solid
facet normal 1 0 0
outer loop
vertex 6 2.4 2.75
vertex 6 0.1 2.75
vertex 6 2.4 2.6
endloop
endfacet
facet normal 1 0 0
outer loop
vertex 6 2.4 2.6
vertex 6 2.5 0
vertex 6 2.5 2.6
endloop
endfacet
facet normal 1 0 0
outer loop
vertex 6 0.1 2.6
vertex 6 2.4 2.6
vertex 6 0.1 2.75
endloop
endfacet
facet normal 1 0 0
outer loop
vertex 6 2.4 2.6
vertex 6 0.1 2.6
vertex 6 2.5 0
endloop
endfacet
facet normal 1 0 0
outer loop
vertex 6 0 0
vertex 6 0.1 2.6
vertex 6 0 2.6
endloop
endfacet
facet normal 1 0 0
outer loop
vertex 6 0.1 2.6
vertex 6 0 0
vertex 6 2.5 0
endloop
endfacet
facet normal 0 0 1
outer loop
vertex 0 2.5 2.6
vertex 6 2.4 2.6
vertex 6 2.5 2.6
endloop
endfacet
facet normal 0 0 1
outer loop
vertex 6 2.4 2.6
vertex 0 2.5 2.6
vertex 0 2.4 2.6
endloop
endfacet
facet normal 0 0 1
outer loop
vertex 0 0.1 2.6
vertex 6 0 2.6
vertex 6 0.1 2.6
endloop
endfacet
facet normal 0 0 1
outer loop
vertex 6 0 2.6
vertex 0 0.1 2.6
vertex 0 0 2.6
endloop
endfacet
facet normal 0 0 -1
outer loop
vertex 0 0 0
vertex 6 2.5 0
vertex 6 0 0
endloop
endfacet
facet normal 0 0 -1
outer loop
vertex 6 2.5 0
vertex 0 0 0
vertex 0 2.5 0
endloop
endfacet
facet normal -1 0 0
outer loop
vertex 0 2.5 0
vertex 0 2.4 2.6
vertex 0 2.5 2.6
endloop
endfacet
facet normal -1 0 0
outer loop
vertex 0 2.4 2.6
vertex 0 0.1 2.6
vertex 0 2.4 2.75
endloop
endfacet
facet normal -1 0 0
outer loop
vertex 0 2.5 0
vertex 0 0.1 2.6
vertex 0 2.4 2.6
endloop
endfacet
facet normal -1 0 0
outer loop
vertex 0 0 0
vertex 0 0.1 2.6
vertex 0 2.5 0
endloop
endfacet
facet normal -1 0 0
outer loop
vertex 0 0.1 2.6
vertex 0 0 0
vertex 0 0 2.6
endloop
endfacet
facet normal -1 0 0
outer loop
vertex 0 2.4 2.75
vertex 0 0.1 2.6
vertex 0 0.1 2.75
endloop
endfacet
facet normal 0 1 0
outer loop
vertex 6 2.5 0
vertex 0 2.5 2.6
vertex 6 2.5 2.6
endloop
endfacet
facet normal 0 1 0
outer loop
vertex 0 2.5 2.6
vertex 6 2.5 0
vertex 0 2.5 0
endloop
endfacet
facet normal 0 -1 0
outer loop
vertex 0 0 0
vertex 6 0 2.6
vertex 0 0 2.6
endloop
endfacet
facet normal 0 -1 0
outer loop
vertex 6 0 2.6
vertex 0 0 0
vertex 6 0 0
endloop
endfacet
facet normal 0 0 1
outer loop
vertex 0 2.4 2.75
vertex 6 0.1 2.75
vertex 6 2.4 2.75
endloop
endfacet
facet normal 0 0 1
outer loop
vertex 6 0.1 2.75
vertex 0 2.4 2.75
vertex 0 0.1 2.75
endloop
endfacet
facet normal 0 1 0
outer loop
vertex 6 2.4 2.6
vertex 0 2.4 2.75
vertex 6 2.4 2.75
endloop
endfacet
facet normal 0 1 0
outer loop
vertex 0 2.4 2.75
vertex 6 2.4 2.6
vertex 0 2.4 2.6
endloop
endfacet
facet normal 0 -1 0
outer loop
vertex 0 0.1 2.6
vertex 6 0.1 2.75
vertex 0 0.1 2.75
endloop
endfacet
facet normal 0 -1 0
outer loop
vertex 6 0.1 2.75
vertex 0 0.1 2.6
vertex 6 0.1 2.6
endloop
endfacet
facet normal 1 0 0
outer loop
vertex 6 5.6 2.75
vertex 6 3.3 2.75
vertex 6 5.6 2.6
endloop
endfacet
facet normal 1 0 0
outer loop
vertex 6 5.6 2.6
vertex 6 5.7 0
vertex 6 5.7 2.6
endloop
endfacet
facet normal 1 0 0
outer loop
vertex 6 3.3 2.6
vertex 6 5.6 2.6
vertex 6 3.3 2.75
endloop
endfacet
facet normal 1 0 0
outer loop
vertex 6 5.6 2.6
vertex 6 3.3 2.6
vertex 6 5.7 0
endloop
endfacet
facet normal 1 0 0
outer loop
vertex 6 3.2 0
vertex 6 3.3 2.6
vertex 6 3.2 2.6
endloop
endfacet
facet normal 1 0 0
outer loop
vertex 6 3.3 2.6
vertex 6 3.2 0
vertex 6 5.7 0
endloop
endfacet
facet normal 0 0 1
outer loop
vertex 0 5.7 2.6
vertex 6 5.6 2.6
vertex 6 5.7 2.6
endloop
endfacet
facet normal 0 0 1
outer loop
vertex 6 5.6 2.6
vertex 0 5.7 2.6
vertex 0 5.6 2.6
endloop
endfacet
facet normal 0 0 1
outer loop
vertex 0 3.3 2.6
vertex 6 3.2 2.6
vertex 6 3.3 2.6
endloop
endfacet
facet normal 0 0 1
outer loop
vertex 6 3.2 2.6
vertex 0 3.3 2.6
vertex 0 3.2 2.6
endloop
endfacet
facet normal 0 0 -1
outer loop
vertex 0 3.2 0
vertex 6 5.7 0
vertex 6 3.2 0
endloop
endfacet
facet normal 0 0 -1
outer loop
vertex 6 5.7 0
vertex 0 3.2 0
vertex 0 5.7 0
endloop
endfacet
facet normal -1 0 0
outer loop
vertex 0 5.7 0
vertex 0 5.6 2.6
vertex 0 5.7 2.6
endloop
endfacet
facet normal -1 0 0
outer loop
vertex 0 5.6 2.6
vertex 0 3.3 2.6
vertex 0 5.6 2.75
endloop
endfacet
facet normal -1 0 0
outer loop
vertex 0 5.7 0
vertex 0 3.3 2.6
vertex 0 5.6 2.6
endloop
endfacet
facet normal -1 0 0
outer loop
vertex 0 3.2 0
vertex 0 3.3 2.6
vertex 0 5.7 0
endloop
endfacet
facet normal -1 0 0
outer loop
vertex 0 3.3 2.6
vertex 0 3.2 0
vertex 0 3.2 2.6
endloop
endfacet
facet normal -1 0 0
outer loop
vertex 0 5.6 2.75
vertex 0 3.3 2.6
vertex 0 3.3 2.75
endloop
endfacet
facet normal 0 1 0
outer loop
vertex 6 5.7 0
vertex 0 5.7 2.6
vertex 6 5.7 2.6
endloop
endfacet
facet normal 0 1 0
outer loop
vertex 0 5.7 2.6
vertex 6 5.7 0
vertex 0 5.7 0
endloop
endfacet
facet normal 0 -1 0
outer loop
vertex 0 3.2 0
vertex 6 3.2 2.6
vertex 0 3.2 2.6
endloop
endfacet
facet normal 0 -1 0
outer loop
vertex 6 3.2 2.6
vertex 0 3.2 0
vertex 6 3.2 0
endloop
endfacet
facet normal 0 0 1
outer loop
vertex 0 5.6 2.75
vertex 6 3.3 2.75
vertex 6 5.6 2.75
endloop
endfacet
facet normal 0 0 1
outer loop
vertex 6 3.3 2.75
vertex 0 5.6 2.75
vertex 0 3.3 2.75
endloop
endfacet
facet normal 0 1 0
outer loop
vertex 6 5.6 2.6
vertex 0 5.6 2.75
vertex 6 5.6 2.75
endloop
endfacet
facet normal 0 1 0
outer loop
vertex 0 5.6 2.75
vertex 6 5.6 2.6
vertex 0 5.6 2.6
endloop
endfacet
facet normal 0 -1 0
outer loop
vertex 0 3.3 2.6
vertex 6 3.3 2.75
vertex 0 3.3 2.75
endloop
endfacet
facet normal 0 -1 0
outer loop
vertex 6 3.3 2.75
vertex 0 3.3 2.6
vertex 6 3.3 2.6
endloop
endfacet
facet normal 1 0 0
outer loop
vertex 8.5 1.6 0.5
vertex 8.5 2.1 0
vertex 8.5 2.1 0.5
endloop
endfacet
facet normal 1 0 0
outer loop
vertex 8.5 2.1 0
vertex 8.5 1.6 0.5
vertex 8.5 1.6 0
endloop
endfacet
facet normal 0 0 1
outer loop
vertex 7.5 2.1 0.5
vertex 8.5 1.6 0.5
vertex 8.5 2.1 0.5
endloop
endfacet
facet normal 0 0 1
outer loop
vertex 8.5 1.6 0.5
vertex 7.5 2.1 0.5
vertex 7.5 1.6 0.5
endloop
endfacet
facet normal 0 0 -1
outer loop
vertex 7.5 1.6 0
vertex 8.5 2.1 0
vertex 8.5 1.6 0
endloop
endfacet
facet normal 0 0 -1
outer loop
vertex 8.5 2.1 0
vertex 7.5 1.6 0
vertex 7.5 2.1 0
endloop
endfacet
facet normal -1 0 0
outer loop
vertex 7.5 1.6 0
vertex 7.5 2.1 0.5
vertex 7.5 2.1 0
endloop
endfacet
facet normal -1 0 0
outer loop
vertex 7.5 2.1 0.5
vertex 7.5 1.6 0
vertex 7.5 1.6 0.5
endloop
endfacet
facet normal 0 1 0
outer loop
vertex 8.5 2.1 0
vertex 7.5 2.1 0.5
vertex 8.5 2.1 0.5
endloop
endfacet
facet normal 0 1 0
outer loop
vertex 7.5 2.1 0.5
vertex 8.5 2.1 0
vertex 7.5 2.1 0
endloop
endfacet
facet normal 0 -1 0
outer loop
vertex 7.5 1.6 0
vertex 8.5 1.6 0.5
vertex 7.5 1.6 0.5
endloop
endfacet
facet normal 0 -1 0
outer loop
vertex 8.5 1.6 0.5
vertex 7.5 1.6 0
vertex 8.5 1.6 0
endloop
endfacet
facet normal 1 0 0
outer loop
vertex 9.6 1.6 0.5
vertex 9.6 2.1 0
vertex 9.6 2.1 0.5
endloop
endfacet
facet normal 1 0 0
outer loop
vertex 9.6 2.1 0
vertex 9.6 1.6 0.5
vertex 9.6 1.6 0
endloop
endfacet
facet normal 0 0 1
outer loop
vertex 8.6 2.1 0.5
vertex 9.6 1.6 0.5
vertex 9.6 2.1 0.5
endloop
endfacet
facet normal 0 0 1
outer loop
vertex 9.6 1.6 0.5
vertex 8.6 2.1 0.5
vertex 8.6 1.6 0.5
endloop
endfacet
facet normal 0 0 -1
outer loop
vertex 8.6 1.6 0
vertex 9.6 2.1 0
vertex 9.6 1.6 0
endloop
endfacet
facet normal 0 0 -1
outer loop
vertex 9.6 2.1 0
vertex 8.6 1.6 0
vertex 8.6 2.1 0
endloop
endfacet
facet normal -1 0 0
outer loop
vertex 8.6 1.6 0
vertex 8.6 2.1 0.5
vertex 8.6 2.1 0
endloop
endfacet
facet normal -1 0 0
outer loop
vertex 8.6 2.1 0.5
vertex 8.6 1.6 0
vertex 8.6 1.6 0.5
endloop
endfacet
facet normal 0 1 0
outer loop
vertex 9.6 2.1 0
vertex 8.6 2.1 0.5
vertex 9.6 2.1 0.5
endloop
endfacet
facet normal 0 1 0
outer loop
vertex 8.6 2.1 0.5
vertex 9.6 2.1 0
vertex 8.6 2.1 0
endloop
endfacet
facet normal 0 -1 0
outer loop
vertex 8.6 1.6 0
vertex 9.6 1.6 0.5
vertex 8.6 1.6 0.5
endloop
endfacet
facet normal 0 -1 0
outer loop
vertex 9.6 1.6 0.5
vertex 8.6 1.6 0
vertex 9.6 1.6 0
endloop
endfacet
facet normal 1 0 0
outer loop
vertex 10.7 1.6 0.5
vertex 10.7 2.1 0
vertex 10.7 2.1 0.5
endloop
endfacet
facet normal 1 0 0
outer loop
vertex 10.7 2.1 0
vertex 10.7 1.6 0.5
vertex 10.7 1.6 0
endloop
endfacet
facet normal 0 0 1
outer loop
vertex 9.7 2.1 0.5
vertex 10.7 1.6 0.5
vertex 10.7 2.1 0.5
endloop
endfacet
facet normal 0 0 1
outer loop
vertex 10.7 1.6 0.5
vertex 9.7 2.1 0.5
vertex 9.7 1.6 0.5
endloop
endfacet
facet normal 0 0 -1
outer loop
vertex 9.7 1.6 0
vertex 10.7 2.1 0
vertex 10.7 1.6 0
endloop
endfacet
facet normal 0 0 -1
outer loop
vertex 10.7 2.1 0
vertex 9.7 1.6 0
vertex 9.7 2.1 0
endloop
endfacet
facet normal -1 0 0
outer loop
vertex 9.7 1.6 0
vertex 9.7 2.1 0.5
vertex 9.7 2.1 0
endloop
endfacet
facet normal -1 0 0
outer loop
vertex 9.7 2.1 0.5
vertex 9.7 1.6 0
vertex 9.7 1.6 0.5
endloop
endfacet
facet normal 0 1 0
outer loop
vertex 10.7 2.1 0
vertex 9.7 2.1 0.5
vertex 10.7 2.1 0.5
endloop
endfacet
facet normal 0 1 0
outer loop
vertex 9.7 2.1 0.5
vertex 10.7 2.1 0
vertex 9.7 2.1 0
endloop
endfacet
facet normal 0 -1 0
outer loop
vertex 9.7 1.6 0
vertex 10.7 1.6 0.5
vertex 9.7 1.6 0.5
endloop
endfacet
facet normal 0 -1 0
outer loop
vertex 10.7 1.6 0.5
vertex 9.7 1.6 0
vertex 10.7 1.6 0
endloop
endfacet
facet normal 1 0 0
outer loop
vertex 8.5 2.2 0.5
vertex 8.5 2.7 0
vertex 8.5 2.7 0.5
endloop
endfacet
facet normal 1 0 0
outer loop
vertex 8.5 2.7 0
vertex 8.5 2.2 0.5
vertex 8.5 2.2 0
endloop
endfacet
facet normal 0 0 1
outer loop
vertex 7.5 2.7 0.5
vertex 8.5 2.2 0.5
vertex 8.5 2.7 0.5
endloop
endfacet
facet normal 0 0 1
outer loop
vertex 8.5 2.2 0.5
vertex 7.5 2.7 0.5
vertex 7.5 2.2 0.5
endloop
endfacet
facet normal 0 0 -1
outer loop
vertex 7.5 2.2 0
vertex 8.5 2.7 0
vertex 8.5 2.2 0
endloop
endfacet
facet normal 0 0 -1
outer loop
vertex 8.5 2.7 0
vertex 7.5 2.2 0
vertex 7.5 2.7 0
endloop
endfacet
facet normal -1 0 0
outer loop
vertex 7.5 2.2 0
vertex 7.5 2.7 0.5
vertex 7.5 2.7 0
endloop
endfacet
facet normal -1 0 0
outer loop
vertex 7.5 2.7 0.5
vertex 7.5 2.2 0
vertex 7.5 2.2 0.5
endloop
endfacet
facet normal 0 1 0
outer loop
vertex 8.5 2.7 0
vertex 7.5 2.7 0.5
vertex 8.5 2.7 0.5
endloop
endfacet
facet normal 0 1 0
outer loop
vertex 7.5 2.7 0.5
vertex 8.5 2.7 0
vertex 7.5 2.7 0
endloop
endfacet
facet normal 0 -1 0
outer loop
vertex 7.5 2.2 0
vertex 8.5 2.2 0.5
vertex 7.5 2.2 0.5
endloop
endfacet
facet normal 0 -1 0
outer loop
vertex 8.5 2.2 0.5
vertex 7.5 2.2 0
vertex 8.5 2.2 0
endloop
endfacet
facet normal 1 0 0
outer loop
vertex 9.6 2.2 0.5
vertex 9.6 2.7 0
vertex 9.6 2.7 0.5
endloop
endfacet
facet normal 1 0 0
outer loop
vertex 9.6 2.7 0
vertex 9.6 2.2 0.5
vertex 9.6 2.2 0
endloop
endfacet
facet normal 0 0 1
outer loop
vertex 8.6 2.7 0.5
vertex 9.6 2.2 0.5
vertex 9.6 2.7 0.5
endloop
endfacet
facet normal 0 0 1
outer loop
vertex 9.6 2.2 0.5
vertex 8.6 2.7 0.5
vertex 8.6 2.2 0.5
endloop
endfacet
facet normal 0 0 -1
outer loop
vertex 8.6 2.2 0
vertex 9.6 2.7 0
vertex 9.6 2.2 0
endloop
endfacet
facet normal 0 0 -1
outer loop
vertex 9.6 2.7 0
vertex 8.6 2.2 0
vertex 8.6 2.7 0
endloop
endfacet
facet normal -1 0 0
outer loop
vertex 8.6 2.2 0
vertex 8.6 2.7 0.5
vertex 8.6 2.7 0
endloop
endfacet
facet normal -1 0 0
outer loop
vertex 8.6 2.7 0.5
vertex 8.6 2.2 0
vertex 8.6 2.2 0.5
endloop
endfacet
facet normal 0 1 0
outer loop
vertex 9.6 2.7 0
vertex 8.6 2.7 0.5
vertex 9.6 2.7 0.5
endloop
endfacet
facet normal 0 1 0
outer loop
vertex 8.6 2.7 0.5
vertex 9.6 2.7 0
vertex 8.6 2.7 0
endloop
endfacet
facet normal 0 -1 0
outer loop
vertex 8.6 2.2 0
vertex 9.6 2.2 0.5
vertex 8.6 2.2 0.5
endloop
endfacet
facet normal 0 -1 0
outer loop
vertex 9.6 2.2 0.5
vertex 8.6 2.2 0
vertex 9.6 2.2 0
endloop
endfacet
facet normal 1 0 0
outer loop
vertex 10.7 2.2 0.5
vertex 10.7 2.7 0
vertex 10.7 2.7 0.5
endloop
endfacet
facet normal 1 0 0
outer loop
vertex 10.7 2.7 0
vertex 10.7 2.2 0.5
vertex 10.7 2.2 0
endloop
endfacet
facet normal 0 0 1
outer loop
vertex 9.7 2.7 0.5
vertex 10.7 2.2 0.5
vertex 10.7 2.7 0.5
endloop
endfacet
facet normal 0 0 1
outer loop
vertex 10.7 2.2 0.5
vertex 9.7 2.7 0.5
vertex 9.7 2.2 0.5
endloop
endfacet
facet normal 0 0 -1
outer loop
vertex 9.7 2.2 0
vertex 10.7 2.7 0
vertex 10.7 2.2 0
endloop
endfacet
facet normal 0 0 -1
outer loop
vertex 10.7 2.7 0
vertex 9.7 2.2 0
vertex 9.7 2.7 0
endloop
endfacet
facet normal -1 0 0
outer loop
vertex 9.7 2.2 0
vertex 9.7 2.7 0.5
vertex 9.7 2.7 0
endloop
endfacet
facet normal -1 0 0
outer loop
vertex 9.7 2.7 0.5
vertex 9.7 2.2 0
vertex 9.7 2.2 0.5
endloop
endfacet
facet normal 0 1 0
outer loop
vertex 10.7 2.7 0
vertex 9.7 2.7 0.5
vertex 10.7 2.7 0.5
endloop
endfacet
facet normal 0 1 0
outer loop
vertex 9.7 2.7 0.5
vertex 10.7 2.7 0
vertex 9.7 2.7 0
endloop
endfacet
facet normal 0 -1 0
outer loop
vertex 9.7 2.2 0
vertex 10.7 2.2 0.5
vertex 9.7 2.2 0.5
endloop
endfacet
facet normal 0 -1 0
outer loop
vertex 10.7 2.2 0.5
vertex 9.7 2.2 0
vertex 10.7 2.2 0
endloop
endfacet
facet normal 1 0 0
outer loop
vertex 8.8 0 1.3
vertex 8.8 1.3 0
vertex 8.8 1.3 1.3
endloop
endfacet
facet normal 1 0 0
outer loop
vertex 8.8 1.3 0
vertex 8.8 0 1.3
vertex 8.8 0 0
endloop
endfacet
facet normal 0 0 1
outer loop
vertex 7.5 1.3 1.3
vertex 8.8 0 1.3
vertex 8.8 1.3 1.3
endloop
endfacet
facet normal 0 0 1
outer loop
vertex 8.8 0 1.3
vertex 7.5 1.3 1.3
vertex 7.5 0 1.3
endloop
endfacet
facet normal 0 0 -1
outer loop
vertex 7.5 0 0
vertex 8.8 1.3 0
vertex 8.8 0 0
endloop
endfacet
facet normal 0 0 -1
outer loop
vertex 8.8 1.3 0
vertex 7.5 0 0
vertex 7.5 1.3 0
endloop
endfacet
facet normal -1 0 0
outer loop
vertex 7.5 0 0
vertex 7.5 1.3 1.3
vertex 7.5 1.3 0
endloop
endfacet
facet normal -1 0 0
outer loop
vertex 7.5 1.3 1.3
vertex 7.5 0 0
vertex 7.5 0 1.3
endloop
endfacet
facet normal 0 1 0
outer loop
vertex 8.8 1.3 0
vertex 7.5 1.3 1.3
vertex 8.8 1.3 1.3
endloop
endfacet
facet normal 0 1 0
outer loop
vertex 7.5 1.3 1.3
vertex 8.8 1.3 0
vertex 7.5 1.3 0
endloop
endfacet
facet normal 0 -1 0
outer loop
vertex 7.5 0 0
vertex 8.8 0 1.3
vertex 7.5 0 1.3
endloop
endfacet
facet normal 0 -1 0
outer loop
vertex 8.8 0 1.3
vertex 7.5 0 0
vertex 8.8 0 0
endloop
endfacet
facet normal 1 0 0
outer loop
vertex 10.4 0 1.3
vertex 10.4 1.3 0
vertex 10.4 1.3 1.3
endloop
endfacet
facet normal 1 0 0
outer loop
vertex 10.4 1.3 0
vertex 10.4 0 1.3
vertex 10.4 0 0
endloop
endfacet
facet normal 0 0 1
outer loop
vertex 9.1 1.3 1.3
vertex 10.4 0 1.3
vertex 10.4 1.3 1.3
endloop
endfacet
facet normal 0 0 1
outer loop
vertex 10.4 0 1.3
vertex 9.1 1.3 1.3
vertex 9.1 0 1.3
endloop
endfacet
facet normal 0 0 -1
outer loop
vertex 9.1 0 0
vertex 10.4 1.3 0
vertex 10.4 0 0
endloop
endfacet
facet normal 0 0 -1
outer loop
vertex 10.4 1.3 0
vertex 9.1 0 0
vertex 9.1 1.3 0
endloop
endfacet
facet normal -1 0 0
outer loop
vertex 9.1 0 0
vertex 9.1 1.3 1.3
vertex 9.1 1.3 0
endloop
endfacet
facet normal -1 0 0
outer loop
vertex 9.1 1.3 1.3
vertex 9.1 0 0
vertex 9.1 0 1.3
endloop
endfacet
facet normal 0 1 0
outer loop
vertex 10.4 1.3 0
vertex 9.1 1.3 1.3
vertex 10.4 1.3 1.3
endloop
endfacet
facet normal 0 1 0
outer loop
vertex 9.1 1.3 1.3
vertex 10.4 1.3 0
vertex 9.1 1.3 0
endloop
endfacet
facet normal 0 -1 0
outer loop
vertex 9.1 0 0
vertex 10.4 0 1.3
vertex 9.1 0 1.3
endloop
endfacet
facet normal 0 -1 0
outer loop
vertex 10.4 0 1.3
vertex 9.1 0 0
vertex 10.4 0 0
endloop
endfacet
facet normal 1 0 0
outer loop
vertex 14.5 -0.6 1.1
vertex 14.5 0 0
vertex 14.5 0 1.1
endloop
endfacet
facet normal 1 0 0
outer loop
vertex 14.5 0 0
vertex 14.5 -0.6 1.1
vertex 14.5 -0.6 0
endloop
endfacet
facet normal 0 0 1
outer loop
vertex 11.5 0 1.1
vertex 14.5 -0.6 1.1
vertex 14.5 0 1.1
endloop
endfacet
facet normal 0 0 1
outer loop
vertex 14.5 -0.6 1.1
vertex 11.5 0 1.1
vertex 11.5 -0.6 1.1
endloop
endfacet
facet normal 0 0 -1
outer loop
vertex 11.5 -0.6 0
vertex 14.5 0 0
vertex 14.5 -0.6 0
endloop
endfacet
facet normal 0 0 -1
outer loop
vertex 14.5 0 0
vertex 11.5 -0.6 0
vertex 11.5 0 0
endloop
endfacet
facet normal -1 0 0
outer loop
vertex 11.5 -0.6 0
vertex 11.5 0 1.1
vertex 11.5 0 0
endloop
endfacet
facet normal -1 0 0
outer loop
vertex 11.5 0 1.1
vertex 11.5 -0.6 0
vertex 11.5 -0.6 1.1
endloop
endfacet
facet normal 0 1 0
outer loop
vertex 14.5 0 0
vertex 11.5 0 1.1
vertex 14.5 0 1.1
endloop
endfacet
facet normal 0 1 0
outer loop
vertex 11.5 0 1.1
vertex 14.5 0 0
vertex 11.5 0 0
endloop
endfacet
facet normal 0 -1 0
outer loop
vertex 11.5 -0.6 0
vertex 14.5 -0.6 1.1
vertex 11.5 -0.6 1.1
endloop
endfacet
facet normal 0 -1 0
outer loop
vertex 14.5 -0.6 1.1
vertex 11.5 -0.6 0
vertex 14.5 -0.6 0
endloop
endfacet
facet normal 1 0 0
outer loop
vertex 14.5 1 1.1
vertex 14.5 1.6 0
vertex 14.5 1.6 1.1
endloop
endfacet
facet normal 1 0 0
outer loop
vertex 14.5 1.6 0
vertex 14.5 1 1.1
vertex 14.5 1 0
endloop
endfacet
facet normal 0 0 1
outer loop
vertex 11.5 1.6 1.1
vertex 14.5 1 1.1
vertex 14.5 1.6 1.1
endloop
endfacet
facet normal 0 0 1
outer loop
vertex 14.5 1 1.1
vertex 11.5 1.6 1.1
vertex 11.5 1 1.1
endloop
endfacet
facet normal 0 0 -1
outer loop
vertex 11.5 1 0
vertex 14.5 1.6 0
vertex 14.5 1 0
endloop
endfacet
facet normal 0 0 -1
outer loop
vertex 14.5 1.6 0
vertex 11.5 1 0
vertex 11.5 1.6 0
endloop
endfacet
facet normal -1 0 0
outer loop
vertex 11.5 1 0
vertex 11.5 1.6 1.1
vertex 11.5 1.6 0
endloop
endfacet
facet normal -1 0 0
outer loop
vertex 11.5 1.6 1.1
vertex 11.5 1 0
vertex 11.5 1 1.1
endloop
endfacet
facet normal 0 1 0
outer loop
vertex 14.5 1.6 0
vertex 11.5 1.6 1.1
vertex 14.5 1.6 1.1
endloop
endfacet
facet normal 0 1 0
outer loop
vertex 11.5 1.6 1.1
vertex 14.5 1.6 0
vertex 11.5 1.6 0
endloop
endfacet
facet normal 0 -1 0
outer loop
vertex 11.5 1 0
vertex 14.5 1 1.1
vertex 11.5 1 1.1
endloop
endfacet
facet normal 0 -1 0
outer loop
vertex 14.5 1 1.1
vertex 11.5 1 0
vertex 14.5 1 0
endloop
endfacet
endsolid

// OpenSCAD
// 掩体道具 (battle_cover) — 集装箱/沙袋/路障/木箱 低矮掩体
// 散布在建筑之间，形成交火线与安全角，是枪战地图的命脉
$fn = 4;

module container() {
  // 集装箱
  color([0.62, 0.30, 0.24]) cube([6, 2.5, 2.6]);
  color([0.30, 0.30, 0.32]) translate([0, 0.1, 2.6]) cube([6, 2.3, 0.15]);
}

module sandbags() {
  color([0.74, 0.68, 0.52])
    for (i = [0 : 1]) for (j = [0 : 2])
      translate([j * 1.1, i * 0.6, 0]) cube([1.0, 0.5, 0.5]);
}

module barrier() {
  // 混凝土路障
  color([0.80, 0.80, 0.78]) cube([3, 0.6, 1.1]);
}

module crate() {
  color([0.55, 0.40, 0.26]) cube([1.3, 1.3, 1.3]);
}

module cover_cluster() {
  // 一组掩体：双层集装箱 + 木箱 + 沙袋 + 路障
  translate([0, 0, 0]) container();
  translate([0, 3.2, 0]) container();
  translate([7.5, 0, 0]) crate();
  translate([9.1, 0, 0]) crate();
  translate([7.5, 1.6, 0]) sandbags();
  translate([11.5, -0.6, 0]) barrier();
  translate([11.5, 1.0, 0]) barrier();
}

cover_cluster();
